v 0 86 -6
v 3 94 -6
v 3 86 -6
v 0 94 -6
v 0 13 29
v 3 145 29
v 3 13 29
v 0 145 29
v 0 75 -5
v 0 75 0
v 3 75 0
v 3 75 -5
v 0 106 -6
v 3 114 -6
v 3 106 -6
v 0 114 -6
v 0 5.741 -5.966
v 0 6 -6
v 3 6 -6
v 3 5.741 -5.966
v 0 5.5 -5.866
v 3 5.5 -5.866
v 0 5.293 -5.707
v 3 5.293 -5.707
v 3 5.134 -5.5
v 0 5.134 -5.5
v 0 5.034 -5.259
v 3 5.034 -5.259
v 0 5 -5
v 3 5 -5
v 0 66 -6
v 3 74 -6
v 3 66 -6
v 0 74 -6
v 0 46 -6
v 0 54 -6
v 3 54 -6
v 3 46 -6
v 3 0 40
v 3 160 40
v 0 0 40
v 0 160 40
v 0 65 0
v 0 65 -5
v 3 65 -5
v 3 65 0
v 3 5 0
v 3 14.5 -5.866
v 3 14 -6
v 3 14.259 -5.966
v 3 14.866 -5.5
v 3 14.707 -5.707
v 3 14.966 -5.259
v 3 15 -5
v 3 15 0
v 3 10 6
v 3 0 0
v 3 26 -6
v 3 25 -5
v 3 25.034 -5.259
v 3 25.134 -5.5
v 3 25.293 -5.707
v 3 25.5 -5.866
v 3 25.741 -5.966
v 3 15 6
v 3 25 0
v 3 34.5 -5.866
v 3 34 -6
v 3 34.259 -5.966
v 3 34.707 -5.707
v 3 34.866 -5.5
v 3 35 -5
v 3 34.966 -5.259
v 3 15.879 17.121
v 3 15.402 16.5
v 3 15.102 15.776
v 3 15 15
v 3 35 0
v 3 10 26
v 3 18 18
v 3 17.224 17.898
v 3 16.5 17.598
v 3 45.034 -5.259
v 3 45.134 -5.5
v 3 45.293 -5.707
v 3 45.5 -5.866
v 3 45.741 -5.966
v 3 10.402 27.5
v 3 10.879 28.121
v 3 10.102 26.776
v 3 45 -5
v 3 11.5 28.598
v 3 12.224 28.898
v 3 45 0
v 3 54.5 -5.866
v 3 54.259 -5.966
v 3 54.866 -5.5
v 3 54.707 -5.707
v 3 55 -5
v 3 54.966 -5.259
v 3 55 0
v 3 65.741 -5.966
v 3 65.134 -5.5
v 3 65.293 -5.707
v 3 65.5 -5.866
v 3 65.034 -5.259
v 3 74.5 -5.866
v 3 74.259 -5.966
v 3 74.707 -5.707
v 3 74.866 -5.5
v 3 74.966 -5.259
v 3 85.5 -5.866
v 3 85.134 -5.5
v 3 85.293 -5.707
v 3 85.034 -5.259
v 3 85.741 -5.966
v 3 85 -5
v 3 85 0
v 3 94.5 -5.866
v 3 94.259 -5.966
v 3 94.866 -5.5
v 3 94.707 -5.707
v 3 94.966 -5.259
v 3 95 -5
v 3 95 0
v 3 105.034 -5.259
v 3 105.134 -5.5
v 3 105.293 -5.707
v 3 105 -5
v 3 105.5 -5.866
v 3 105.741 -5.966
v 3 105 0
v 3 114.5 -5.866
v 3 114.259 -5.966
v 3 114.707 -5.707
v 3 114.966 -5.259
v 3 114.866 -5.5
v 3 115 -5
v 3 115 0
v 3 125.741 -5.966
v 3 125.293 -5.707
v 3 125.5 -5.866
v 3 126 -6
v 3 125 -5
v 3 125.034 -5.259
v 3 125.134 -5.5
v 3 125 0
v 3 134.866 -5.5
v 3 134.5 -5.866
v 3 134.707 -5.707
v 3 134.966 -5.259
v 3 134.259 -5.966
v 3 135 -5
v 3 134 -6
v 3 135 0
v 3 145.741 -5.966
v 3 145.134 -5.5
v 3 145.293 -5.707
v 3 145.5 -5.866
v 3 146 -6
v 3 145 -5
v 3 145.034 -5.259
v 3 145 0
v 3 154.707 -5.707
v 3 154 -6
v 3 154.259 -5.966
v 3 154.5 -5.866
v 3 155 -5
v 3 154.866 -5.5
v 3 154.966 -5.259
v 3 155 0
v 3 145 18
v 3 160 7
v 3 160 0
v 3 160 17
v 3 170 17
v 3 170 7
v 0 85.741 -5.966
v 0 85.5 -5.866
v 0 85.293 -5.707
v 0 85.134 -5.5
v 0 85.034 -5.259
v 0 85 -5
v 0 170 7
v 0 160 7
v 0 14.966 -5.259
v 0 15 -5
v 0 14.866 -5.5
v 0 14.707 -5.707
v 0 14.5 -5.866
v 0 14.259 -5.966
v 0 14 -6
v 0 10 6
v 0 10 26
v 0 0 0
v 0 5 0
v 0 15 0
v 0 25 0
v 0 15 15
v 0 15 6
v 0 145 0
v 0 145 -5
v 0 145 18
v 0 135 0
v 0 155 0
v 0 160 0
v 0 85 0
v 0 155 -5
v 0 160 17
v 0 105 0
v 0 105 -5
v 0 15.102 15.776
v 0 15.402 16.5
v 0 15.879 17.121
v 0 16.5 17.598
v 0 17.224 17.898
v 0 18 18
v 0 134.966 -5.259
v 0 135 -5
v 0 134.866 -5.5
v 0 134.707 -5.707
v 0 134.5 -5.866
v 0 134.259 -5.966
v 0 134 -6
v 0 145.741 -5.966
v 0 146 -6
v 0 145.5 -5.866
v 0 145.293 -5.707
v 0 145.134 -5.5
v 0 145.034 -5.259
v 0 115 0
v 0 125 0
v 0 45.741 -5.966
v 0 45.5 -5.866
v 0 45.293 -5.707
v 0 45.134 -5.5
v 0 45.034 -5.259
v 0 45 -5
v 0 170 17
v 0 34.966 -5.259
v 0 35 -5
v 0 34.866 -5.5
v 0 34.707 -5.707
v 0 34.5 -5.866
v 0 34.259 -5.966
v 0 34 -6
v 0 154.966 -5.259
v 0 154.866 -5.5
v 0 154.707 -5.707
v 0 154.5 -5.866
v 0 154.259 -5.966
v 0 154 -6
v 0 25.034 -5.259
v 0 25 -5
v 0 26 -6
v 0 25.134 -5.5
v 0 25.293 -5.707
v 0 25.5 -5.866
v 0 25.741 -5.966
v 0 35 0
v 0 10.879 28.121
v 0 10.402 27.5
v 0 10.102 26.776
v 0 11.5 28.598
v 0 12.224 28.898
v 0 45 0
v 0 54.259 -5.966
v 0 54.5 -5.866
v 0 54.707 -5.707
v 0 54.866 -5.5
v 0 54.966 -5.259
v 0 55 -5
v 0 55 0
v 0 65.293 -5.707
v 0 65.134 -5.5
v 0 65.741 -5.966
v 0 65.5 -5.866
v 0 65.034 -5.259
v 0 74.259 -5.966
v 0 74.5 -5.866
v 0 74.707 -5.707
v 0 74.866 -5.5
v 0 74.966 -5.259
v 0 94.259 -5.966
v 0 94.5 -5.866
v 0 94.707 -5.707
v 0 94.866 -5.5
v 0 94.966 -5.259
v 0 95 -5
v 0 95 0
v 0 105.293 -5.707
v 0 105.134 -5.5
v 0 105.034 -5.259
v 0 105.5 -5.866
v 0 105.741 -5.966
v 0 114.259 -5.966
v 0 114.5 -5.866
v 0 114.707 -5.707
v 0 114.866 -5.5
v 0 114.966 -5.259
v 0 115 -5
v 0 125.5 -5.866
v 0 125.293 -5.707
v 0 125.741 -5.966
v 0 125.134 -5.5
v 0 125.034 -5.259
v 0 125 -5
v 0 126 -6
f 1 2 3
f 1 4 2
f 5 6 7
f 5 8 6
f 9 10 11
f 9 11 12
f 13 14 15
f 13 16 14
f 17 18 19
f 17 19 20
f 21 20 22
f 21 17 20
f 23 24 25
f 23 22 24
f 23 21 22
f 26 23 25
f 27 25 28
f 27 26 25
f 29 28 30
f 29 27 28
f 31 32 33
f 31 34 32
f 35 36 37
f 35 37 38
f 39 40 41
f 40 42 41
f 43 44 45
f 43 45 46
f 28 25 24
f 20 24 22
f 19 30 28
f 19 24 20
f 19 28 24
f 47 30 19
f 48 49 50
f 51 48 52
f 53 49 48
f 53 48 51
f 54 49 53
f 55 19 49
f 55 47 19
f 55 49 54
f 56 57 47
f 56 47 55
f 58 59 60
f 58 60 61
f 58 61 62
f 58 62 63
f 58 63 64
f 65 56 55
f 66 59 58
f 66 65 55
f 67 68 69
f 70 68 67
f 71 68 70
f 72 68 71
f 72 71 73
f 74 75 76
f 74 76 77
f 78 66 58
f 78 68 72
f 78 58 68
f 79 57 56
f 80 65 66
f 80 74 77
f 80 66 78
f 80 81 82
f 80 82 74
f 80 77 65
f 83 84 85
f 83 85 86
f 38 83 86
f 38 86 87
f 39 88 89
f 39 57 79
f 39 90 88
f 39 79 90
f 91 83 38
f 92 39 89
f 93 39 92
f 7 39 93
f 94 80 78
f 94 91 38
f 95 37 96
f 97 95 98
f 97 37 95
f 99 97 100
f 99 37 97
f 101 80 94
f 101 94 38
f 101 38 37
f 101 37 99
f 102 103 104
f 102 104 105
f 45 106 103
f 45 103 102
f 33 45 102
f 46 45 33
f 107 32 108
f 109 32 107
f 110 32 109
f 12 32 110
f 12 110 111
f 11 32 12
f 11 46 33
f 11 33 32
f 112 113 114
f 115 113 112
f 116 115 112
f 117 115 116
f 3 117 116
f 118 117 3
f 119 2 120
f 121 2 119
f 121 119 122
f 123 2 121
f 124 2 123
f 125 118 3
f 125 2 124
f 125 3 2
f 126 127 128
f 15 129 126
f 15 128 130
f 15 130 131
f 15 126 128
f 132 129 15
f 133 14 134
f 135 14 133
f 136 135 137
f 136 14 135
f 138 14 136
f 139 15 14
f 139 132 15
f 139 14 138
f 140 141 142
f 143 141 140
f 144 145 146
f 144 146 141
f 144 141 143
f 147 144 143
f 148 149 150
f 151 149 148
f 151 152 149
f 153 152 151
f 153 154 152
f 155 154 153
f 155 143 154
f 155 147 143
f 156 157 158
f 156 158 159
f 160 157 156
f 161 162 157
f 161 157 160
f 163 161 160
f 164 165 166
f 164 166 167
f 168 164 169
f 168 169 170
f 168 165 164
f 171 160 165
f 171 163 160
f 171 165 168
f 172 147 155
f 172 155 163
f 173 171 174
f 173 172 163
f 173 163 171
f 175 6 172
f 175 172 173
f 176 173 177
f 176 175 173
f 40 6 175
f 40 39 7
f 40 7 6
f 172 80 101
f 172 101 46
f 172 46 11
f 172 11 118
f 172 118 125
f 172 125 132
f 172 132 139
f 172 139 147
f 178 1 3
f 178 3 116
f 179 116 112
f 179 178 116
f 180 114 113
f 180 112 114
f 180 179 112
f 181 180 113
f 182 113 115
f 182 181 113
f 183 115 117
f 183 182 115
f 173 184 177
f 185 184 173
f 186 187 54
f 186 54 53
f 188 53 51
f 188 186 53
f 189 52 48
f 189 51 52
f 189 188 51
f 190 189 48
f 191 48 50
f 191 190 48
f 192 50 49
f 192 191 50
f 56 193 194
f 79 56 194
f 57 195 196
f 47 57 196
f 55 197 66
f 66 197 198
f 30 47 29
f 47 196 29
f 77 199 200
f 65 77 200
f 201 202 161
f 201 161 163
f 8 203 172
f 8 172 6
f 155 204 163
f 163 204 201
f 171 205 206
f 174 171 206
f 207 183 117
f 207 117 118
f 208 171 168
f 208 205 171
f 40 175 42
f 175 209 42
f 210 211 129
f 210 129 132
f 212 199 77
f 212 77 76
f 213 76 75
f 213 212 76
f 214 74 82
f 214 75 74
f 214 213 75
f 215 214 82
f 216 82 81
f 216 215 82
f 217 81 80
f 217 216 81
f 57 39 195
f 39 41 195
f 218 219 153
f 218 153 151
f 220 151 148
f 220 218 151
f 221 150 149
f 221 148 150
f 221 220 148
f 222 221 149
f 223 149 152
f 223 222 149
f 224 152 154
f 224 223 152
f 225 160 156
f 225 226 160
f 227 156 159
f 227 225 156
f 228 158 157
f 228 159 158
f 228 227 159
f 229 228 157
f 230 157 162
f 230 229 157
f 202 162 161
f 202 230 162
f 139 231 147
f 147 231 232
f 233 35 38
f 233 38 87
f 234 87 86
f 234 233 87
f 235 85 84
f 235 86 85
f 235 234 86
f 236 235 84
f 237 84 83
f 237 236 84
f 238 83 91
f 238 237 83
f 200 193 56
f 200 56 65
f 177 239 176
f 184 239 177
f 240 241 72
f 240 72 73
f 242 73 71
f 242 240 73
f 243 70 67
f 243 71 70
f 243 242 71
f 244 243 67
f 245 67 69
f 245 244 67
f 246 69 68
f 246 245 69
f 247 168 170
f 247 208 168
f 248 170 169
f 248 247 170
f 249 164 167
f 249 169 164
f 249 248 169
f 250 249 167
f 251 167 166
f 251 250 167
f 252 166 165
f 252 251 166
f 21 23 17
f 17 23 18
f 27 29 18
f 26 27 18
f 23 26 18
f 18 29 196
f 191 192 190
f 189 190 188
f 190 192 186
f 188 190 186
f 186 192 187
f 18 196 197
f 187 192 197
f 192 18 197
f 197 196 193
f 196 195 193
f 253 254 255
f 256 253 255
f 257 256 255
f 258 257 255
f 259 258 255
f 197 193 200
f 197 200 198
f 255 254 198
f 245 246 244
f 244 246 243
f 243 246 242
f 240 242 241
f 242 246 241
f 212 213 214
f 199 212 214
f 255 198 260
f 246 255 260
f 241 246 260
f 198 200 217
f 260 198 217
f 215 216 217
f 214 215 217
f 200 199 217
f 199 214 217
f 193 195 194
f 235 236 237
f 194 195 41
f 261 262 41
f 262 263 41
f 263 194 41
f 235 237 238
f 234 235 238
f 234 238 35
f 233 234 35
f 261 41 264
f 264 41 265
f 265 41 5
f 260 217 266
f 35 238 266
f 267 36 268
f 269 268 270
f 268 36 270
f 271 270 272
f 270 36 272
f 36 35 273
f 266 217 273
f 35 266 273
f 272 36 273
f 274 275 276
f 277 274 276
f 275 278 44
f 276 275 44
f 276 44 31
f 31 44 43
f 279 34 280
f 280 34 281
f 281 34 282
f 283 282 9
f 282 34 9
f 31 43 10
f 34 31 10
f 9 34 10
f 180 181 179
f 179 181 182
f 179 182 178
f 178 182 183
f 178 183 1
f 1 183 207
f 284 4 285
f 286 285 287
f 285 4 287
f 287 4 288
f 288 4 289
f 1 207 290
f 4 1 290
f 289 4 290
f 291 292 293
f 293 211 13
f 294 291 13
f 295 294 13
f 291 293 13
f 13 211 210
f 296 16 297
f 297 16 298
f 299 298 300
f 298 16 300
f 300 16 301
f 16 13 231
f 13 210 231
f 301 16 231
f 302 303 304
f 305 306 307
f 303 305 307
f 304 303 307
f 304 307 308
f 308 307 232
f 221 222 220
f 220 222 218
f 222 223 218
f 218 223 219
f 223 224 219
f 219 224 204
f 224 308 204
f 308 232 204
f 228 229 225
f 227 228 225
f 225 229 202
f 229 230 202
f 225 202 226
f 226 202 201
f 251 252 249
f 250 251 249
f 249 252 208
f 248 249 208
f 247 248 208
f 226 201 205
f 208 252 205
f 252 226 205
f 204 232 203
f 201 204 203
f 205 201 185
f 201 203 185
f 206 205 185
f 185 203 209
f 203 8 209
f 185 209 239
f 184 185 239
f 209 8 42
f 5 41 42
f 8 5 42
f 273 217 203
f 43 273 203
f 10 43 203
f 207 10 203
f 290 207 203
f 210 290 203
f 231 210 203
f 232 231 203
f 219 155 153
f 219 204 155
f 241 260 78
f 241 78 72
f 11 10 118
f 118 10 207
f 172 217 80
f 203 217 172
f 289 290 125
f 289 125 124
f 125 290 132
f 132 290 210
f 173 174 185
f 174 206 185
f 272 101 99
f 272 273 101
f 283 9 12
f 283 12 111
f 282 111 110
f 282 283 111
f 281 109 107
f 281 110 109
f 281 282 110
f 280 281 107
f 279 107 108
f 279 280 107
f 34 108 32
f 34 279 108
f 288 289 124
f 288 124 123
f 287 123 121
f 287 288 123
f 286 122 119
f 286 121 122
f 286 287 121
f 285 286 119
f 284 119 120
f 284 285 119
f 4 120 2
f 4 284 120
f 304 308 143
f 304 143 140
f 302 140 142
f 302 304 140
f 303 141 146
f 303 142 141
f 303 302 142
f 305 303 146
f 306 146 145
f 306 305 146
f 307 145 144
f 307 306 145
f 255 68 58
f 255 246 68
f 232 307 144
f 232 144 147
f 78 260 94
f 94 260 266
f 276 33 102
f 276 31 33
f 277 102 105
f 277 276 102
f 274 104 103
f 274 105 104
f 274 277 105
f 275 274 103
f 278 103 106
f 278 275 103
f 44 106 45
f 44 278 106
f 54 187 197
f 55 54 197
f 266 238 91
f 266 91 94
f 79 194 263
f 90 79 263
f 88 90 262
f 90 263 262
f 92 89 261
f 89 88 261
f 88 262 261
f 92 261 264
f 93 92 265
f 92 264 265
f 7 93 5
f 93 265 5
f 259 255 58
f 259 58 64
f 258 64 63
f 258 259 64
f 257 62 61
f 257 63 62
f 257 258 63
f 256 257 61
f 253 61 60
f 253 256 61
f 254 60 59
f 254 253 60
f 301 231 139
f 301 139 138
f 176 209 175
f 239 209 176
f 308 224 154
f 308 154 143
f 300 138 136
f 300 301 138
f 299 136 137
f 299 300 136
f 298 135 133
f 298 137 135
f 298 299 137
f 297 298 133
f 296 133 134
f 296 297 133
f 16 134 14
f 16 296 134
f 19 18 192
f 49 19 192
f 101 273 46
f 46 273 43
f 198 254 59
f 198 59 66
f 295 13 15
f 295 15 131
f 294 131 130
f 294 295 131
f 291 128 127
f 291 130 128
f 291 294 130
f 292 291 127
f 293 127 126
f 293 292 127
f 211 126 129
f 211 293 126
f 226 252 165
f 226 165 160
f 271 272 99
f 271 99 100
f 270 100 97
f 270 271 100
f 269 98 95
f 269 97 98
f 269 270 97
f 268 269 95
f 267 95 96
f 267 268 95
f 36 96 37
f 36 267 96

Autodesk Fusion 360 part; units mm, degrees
sketch "Sketch1" plane through (0, 0, 0) normal (1, 0, 0) x (0, 1, 0)
  line L0 (0, 0) -> (160, 0)
  line L1 (160, 0) -> (160, 40)
  line L2 (160, 40) -> (0, 40)
  line L3 (0, 40) -> (0, 0)
  line L4 (5, 0) -> (5, -5)
  line L5 (6, -6) -> (14, -6)
  line L6 (15, -5) -> (15, 0)
  line L7 (25, 0) -> (35, 0)
  line L8 (35, 0) -> (35, -5)
  line L9 (34, -6) -> (26, -6)
  line L10 (25, -5) -> (25, 0)
  line L11 (45, 0) -> (55, 0)
  line L12 (55, 0) -> (55, -5)
  line L13 (54, -6) -> (46, -6)
  line L14 (45, -5) -> (45, 0)
  line L15 (65, 0) -> (75, 0)
  line L16 (75, 0) -> (75, -5)
  line L17 (74, -6) -> (66, -6)
  line L18 (65, -5) -> (65, 0)
  line L19 (85, 0) -> (95, 0)
  line L20 (95, 0) -> (95, -5)
  line L21 (94, -6) -> (86, -6)
  line L22 (85, -5) -> (85, 0)
  line L23 (105, 0) -> (115, 0)
  line L24 (115, 0) -> (115, -5)
  line L25 (114, -6) -> (106, -6)
  line L26 (105, -5) -> (105, 0)
  line L27 (125, 0) -> (135, 0)
  line L28 (135, 0) -> (135, -5)
  line L29 (134, -6) -> (126, -6)
  line L30 (125, -5) -> (125, 0)
  line L31 (145, 0) -> (155, 0)
  line L32 (155, 0) -> (155, -5)
  line L33 (154, -6) -> (146, -6)
  line L34 (145, -5) -> (145, 0)
  line L35 (15, -2.5) -> (25, -2.5) construction
  line L36 (35, -2.5) -> (45, -2.5) construction
  line L37 (55, -2.5) -> (65, -2.5) construction
  line L38 (75, -2.5) -> (85, -2.5) construction
  line L39 (95, -2.5) -> (105, -2.5) construction
  line L40 (115, -2.4317) -> (125, -2.4308) construction
  line L41 (135, -2.5) -> (145, -2.5054) construction
  line L42 (10, 0) -> (10, 18)
  line L43 (15, 15) -> (15, 0)
  line L44 (10, 6) -> (15, 6)
  line L45 (10, 18) -> (10, 26)
  line L46 (18, 18) -> (145, 18)
  line L47 (145, 18) -> (145, 29)
  line L48 (145, 29) -> (13, 29)
  line L49 (15, 6) -> (160, 6) construction
  line L50 (145, 18) -> (145, 6) construction
  arc A0 (13, 29) -> (10, 26) centre (13, 26) ccw
  arc A1 (18, 18) -> (15, 15) centre (18, 15) ccw
  line L51 (25, 18) -> (25, 0) construction
  line L52 (160, 14.5) -> (160, 9.5) construction
  line L53 (19.9191, 18) -> (19.9191, 6) construction
  line L54 (160, 7) -> (160, 17) construction
  arc A2 (5, -5) -> (6, -6) centre (6, -5) ccw
  arc A3 (14, -6) -> (15, -5) centre (14, -5) ccw
  arc A4 (25, -5) -> (26, -6) centre (26, -5) ccw
  arc A5 (34, -6) -> (35, -5) centre (34, -5) ccw
  arc A6 (45, -5) -> (46, -6) centre (46, -5) ccw
  arc A7 (54, -6) -> (55, -5) centre (54, -5) ccw
  arc A8 (65, -5) -> (66, -6) centre (66, -5) ccw
  arc A9 (74, -6) -> (75, -5) centre (74, -5) ccw
  arc A10 (85, -5) -> (86, -6) centre (86, -5) ccw
  arc A11 (94, -6) -> (95, -5) centre (94, -5) ccw
  arc A12 (105, -5) -> (106, -6) centre (106, -5) ccw
  arc A13 (114, -6) -> (115, -5) centre (114, -5) ccw
  arc A14 (125, -5) -> (126, -6) centre (126, -5) ccw
  arc A15 (134, -6) -> (135, -5) centre (134, -5) ccw
  arc A16 (145, -5) -> (146, -6) centre (146, -5) ccw
  arc A17 (154, -6) -> (155, -5) centre (154, -5) ccw
  line L55 (160, 17) -> (170, 17)
  line L56 (170, 17) -> (170, 7)
  line L57 (170, 7) -> (160, 7)
  line L58 (160, 7) -> (160, 17)
  line L59 (170, 12) -> (19.9191, 12) construction
  point P0 (5, -6)
  point P1 (15, -6)
  point P2 (15, 18)
  point P3 (10, 29)
  dimension "d1" = 160
  dimension "d2" = 40
  dimension "d3" = 10
  dimension "d4" = 6
  dimension "d5" = 5
  dimension "d6" = 10
  dimension "d7" = 5
  dimension "d9" = 18
  dimension "d10" = 5
  dimension "d15" = 11
  dimension "d16" = 130
  dimension "d17" = 12
  dimension "d18" = 3
  dimension "d19" = 3
  dimension "d29" = 1
  dimension "d30" = 1
  dimension "d31" = 1
  dimension "d32" = 1
  dimension "d33" = 1
  dimension "d34" = 1
  dimension "d35" = 1
  dimension "d36" = 1
  dimension "d37" = 1
  dimension "d38" = 1
  dimension "d39" = 1
  dimension "d40" = 1
  dimension "d41" = 1
  dimension "d42" = 1
  dimension "d43" = 1
  dimension "d44" = 1
  dimension "d45" = 10
  dimension "d46" = 10
extrude "Extrude1" add sketch "Sketch1" along normal blind 3 contours L0 L1 L2 L3 L7 L11 L15 L19 L23 L27 L31 L42 L43 L45 L46 L47 L48 A0 A1 L58 | L0 L4 L5 L6 A2 A3 | L0 L42 L43 L44 | L1 L55 L56 L57 L58 | L0 L7 L8 L9 L10 A4 A5 | L0 L11 L12 L13 L14 A6 A7 | L0 L31 L32 L33 L34 A16 A17 | L0 L15 L16 L17 L18 A8 A9 | L0 L27 L28 L29 L30 A14 A15 | L0 L19 L20 L21 L22 A10 A11 | L0 L23 L24 L25 L26 A12 A13
sketch "Sketch2" plane through (3, 0, 0) normal (1, 0, 0) x (0, 1, 0)
  line L0 (145, 29) -> (145, 18)
  line L1 (145, 18) -> (18, 18)
  arc A0 (18, 18) -> (15, 15) centre (18, 15) ccw
  line L2 (15, 15) -> (15, 6)
  line L3 (15, 6) -> (10, 6)
  line L4 (10, 6) -> (10, 26)
  arc A1 (13, 29) -> (10, 26) centre (13, 26) ccw
  line L5 (13, 29) -> (145, 29)
  line L6 (160, 17) -> (160, 40)
  line L7 (160, 40) -> (0, 40)
  line L8 (0, 40) -> (0, 0)
  line L9 (0, 0) -> (5, 0)
  line L10 (5, 0) -> (5, -5)
  arc A2 (5, -5) -> (6, -6) centre (6, -5) ccw
  line L11 (6, -6) -> (14, -6)
  arc A3 (14, -6) -> (15, -5) centre (14, -5) ccw
  line L12 (15, -5) -> (15, 0)
  line L13 (15, 0) -> (25, 0)
  line L14 (25, 0) -> (25, -5)
  arc A4 (25, -5) -> (26, -6) centre (26, -5) ccw
  line L15 (26, -6) -> (34, -6)
  arc A5 (34, -6) -> (35, -5) centre (34, -5) ccw
  line L16 (35, -5) -> (35, 0)
  line L17 (35, 0) -> (45, 0)
  line L18 (45, 0) -> (45, -5)
  arc A6 (45, -5) -> (46, -6) centre (46, -5) ccw
  line L19 (46, -6) -> (54, -6)
  arc A7 (54, -6) -> (55, -5) centre (54, -5) ccw
  line L20 (55, -5) -> (55, 0)
  line L21 (55, 0) -> (65, 0)
  line L22 (65, 0) -> (65, -5)
  arc A8 (65, -5) -> (66, -6) centre (66, -5) ccw
  line L23 (66, -6) -> (74, -6)
  arc A9 (74, -6) -> (75, -5) centre (74, -5) ccw
  line L24 (75, -5) -> (75, 0)
  line L25 (75, 0) -> (85, 0)
  line L26 (85, 0) -> (85, -5)
  arc A10 (85, -5) -> (86, -6) centre (86, -5) ccw
  line L27 (86, -6) -> (94, -6)
  arc A11 (94, -6) -> (95, -5) centre (94, -5) ccw
  line L28 (95, -5) -> (95, 0)
  line L29 (95, 0) -> (105, 0)
  line L30 (105, 0) -> (105, -5)
  arc A12 (105, -5) -> (106, -6) centre (106, -5) ccw
  line L31 (106, -6) -> (114, -6)
  arc A13 (114, -6) -> (115, -5) centre (114, -5) ccw
  line L32 (115, -5) -> (115, 0)
  line L33 (115, 0) -> (125, 0)
  line L34 (125, 0) -> (125, -5)
  arc A14 (125, -5) -> (126, -6) centre (126, -5) ccw
  line L35 (126, -6) -> (134, -6)
  arc A15 (134, -6) -> (135, -5) centre (134, -5) ccw
  line L36 (135, -5) -> (135, 0)
  line L37 (135, 0) -> (145, 0)
  line L38 (145, 0) -> (145, -5)
  arc A16 (145, -5) -> (146, -6) centre (146, -5) ccw
  line L39 (146, -6) -> (154, -6)
  arc A17 (154, -6) -> (155, -5) centre (154, -5) ccw
  line L40 (155, -5) -> (155, 0)
  line L41 (155, 0) -> (160, 0)
  line L42 (160, 0) -> (160, 7)
  line L43 (160, 7) -> (170, 7)
  line L44 (170, 7) -> (170, 17)
  line L45 (170, 17) -> (160, 17)
